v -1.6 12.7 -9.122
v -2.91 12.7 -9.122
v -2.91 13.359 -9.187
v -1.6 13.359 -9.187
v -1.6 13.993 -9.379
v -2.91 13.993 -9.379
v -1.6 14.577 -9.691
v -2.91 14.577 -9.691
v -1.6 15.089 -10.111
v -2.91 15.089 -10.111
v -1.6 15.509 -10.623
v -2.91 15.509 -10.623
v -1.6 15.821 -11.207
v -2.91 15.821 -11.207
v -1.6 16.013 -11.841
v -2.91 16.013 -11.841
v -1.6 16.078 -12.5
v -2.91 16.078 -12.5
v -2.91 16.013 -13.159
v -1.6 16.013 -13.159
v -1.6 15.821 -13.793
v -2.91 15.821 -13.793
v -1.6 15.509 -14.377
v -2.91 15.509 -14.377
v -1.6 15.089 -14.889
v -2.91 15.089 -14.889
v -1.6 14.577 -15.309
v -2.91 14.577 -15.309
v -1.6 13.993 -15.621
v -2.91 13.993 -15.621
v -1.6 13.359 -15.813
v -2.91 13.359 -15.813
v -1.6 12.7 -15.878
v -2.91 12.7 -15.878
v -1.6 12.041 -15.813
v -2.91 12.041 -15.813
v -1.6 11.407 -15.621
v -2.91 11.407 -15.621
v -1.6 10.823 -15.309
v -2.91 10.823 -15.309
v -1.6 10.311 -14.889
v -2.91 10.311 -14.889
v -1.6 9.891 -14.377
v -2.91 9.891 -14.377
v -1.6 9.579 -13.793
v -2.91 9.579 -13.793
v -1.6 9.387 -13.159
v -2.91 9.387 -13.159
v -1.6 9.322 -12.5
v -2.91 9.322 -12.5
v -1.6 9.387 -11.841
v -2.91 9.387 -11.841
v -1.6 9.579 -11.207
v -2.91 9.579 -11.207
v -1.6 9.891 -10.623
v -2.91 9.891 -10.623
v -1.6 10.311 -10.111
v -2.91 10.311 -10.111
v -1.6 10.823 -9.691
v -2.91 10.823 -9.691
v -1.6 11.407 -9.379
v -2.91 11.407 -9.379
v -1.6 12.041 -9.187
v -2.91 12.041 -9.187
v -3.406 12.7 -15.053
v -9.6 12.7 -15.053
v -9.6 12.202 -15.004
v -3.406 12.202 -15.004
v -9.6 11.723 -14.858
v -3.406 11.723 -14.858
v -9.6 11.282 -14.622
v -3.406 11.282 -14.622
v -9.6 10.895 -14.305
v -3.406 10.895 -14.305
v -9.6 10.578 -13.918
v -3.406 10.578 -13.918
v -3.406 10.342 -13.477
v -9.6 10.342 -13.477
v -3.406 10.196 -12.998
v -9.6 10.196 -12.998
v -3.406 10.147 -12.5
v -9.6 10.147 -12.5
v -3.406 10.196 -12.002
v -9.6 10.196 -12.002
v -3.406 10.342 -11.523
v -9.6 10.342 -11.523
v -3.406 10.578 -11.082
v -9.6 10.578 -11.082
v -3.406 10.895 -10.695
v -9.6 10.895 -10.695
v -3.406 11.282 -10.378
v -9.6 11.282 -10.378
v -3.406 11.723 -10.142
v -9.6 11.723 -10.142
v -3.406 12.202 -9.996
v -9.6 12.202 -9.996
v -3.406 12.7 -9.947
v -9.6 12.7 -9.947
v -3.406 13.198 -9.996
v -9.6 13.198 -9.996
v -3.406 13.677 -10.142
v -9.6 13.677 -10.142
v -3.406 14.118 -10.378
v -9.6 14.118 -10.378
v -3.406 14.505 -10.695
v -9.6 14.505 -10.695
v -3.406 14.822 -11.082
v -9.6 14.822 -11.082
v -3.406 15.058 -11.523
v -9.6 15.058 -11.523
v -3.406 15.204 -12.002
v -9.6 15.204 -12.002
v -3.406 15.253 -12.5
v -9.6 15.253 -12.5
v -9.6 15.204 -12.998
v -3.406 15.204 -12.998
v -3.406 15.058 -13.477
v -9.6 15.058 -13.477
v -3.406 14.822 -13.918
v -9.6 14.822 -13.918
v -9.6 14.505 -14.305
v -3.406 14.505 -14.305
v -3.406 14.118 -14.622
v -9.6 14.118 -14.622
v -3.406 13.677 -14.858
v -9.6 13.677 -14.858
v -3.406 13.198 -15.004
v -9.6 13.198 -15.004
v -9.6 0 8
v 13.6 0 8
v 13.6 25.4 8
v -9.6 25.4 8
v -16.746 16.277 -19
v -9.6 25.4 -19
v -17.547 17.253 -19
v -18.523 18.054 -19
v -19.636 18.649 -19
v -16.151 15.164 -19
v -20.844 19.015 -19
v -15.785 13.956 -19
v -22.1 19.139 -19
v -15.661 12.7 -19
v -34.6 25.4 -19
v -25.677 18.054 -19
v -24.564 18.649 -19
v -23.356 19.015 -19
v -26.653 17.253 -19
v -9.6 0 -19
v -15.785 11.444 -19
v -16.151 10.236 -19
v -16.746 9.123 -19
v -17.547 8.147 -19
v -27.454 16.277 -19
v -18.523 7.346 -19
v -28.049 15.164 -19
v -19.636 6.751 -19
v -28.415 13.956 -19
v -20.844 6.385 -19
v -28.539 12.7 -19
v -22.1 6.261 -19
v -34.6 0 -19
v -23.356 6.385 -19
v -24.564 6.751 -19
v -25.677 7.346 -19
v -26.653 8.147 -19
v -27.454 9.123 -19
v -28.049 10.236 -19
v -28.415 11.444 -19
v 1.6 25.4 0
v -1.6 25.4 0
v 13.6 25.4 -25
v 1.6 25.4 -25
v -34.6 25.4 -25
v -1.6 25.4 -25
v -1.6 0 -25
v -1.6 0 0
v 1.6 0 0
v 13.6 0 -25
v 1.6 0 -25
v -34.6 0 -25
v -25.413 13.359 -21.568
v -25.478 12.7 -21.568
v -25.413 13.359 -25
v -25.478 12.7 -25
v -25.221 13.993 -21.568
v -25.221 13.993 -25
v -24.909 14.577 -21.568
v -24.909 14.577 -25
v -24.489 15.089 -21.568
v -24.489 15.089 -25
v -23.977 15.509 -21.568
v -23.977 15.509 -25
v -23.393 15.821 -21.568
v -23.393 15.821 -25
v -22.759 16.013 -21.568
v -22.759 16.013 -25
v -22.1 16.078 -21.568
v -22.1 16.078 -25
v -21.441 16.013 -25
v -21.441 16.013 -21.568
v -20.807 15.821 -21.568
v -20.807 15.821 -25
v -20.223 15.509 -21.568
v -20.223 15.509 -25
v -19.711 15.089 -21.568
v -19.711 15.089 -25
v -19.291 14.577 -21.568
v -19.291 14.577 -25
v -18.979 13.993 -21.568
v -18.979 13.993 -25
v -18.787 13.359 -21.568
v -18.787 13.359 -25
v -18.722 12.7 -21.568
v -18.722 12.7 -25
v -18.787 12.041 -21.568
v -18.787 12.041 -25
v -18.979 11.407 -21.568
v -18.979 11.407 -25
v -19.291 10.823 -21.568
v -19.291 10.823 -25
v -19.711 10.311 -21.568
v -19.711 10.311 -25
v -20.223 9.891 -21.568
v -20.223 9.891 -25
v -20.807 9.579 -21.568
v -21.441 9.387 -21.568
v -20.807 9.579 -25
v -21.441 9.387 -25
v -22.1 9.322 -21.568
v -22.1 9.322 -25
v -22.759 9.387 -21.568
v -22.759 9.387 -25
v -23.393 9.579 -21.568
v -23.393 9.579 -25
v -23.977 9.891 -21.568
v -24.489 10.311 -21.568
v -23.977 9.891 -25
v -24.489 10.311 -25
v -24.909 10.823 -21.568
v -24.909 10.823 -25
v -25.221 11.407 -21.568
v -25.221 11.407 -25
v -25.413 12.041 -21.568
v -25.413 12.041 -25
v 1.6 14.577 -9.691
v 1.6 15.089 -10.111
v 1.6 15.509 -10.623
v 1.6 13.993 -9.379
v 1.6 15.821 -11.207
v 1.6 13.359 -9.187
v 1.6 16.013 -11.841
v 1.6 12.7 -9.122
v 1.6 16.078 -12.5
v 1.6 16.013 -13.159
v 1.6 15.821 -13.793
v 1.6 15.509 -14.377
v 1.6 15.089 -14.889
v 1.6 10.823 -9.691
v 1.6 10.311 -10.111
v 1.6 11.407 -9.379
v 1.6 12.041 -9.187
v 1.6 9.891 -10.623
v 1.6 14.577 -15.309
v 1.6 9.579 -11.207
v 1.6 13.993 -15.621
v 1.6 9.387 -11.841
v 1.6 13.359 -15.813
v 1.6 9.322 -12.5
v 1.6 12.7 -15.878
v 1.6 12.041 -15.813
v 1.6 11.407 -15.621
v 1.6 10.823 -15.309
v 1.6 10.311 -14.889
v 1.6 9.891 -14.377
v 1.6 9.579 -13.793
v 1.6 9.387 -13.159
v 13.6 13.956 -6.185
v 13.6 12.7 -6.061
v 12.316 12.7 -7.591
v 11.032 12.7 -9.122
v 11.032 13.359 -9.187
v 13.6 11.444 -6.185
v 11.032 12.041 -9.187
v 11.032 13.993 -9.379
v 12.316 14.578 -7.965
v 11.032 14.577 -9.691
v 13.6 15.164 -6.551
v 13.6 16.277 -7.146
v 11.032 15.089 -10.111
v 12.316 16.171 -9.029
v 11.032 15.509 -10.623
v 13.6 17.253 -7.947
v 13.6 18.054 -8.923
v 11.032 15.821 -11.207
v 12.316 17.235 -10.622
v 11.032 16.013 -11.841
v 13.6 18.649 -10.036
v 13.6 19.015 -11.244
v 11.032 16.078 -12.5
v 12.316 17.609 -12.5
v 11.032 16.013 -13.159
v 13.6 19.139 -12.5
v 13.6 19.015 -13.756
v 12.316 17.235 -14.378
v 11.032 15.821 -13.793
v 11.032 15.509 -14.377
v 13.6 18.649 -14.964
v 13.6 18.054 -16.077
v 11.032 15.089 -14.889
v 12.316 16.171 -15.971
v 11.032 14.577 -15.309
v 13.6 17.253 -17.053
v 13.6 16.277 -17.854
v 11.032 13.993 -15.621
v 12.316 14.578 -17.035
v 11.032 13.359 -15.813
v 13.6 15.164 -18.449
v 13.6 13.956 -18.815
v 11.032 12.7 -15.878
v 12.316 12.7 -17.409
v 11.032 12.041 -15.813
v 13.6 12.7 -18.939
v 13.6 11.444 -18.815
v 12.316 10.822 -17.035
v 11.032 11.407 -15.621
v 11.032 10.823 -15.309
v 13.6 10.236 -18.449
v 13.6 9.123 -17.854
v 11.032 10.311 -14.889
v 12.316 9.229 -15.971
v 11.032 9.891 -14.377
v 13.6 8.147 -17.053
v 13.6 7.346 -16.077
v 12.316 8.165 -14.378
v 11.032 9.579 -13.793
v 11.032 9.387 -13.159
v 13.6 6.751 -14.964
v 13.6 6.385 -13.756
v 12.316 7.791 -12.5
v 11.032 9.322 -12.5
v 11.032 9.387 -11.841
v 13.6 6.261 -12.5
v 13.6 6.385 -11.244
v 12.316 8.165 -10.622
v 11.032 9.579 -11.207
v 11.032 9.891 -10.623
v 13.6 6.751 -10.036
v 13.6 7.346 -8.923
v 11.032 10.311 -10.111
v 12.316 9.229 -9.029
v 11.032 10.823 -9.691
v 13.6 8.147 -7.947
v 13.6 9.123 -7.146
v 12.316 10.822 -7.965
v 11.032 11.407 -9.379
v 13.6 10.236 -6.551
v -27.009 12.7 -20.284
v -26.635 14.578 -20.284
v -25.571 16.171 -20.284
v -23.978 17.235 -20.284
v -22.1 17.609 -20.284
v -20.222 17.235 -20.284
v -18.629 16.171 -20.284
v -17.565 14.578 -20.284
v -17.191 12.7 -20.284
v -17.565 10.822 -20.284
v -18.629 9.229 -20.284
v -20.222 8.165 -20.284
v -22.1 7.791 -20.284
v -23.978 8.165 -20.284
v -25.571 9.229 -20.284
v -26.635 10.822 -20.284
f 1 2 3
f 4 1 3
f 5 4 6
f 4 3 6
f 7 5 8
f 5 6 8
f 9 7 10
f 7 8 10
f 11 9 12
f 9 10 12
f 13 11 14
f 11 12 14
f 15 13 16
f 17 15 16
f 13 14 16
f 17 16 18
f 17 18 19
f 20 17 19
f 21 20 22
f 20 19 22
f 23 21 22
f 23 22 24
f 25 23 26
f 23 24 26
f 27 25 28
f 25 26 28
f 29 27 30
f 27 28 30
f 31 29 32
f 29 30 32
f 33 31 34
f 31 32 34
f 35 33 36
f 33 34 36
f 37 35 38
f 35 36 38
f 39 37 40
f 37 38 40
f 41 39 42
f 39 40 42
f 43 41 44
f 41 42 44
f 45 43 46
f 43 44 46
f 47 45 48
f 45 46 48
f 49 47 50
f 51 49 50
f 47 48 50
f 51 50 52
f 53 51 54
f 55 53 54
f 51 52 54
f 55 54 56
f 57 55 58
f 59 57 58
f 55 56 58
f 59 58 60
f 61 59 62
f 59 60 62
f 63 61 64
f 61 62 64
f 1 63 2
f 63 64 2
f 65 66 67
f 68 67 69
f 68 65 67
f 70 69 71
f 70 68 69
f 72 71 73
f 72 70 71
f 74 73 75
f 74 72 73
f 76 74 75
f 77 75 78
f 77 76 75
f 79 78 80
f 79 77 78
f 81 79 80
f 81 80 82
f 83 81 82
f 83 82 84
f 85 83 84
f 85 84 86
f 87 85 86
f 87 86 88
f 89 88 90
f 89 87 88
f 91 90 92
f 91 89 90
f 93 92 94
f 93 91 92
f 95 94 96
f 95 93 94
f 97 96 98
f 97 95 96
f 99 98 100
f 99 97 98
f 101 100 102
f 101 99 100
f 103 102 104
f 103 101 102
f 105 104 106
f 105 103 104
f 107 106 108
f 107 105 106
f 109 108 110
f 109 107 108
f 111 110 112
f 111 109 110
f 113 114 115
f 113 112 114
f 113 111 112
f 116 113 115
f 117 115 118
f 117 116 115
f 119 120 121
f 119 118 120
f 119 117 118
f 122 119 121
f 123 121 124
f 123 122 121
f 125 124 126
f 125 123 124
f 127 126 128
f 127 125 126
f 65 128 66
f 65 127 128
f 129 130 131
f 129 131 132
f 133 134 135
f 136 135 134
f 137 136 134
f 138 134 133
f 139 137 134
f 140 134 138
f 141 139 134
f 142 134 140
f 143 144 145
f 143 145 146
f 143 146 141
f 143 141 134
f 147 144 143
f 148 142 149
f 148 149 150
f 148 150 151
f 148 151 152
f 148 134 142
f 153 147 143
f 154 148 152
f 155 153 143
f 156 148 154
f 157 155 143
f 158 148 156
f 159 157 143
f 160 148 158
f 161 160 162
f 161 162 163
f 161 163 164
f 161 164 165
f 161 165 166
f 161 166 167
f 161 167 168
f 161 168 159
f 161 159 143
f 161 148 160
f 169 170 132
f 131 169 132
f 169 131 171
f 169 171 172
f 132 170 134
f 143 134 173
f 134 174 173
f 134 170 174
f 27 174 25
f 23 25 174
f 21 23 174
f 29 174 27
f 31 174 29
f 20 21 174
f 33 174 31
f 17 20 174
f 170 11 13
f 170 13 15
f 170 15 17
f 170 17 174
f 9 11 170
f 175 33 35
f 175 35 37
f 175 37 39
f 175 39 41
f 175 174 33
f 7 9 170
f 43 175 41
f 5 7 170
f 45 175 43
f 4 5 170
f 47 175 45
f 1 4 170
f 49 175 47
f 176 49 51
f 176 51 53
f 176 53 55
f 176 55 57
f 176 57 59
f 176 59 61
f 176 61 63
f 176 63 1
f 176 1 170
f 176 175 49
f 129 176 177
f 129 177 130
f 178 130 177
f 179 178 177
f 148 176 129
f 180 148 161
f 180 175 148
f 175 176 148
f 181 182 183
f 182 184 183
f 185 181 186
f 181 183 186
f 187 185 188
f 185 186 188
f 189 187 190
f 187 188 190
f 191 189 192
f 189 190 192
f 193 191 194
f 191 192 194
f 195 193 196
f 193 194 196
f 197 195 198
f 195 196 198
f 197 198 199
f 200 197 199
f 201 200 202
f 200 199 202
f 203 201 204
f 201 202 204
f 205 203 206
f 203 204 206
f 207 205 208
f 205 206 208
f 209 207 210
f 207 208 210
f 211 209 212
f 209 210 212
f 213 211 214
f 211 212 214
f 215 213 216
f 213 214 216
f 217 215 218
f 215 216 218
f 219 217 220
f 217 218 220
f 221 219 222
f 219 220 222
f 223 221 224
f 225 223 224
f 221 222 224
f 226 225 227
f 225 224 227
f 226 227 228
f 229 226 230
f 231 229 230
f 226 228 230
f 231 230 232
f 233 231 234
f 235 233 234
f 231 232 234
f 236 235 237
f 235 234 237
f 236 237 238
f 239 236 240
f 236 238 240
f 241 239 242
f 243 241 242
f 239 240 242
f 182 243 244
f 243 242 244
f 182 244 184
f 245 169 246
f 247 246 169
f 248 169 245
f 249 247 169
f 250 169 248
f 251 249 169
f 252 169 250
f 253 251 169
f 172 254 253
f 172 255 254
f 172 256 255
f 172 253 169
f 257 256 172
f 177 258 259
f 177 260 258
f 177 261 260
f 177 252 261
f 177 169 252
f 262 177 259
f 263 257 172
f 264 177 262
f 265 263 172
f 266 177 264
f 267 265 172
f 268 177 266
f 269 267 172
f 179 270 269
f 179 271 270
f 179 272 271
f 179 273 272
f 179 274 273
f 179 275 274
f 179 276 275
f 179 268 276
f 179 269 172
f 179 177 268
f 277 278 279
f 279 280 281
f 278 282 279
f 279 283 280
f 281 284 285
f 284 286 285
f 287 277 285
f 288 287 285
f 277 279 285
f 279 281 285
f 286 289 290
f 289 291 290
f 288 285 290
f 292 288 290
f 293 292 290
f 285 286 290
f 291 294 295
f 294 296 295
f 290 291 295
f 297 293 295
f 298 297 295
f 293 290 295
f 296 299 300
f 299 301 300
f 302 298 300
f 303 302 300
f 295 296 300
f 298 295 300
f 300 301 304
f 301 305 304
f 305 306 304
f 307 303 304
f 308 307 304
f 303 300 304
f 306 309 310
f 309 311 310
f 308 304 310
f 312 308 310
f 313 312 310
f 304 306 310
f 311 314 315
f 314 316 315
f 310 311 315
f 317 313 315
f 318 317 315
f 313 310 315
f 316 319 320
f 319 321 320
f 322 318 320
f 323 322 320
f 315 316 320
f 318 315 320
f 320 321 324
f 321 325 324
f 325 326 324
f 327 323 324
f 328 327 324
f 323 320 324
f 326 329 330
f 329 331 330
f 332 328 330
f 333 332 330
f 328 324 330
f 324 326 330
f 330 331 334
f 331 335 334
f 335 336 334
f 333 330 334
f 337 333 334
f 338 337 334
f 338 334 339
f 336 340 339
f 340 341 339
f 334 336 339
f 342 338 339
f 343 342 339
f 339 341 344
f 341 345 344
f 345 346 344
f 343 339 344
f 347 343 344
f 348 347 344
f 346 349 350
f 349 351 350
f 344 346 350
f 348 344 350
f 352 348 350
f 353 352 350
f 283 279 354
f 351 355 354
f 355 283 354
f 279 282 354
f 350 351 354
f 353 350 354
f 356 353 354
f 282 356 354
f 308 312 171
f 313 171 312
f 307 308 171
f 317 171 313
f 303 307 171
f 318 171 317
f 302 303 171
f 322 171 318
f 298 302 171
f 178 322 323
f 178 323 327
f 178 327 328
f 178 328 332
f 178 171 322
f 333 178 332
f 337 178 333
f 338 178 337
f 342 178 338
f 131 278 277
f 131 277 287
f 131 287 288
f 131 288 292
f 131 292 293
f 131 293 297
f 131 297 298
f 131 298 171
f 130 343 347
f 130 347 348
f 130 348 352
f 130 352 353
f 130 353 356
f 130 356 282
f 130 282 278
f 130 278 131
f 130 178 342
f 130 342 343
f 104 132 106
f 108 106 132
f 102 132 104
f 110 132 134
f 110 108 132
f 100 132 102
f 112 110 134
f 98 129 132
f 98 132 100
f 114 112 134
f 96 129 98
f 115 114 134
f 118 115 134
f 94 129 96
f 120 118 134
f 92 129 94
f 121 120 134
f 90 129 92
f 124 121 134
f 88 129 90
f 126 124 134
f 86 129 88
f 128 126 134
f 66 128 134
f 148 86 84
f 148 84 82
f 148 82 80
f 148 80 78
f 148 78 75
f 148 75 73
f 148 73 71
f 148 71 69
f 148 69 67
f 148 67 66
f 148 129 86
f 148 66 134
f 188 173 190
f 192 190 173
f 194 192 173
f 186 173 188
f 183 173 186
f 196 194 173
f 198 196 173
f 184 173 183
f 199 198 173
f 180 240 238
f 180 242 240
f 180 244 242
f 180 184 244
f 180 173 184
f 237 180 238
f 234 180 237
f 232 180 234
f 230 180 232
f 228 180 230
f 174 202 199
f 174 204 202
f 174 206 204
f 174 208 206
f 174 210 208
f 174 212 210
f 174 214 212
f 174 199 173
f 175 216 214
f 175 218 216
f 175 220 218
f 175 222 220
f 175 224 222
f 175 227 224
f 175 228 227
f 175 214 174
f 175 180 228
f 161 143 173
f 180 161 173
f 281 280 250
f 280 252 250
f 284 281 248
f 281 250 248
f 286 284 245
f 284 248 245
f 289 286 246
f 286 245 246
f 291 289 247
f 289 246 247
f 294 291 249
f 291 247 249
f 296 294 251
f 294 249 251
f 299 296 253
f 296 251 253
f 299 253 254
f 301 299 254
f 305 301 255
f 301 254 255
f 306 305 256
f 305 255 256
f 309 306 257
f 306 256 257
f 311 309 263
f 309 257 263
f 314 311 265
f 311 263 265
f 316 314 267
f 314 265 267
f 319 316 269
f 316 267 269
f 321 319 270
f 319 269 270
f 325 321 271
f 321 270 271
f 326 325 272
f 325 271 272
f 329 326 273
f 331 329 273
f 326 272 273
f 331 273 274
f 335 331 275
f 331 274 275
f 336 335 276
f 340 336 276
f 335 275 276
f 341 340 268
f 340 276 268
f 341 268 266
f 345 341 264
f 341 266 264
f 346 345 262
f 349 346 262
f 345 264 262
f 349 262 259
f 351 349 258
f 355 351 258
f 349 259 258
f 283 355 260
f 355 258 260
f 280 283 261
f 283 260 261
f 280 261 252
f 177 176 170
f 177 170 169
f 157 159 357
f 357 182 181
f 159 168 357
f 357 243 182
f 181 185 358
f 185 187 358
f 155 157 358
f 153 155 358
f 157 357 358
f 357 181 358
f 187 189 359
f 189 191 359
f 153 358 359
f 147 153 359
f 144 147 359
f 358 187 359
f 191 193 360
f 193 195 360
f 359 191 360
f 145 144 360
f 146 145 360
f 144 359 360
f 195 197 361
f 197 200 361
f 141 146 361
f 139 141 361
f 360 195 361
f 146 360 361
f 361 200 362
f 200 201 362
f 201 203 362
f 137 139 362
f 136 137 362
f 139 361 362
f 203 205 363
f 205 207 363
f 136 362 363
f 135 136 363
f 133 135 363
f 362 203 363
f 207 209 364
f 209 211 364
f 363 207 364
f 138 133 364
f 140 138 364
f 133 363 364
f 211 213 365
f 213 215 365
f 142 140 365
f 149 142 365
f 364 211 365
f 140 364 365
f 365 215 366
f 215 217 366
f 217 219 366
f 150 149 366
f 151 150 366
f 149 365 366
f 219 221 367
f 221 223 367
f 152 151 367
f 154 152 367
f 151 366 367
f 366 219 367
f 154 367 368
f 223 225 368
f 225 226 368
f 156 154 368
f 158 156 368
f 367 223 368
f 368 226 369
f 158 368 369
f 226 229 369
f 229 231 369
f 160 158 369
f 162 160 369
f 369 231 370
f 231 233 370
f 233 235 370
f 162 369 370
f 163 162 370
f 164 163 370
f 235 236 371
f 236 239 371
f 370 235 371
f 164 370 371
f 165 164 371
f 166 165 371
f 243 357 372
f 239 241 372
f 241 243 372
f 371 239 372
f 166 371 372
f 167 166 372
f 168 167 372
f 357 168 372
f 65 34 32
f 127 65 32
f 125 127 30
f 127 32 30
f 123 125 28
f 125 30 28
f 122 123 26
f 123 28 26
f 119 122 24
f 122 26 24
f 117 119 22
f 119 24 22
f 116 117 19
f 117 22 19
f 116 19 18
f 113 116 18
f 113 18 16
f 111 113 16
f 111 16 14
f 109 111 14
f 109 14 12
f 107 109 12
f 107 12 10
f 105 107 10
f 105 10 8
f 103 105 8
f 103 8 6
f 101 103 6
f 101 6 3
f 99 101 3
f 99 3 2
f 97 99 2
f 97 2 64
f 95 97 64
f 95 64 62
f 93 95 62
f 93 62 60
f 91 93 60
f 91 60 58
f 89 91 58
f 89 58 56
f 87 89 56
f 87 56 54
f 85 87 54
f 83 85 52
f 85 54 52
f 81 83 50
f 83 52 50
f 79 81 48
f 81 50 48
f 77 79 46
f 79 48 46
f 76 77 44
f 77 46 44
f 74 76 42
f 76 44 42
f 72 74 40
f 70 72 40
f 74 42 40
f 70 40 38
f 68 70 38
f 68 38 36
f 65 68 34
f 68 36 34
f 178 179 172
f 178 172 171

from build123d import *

# Parameters (mm, degrees)
BOSS_EXTRUDE1_DEPTH                                 = 25.4
CSK_FOR_1_4_FLAT_HEAD_MACHINE_SCREW_100_D           = 6.7564
CSK_FOR_1_4_FLAT_HEAD_MACHINE_SCREW_100_DEPTH       = 16.51
CSK_FOR_1_4_FLAT_HEAD_MACHINE_SCREW_100_CSINK_D     = 12.8778
CSK_FOR_1_4_FLAT_HEAD_MACHINE_SCREW_100_CSINK_ANGLE = 100
CSK_FOR_1_4_FLAT_HEAD_MACHINE_SCREW_100_TIP         = 2.029827343
CSK_FOR_1_4_FLAT_HEAD_MACHINE_SCREW_2_D             = 6.7564
CSK_FOR_1_4_FLAT_HEAD_MACHINE_SCREW_2_DEPTH         = 16.51
CSK_FOR_1_4_FLAT_HEAD_MACHINE_SCREW_2_CSINK_D       = 12.8778
CSK_FOR_1_4_FLAT_HEAD_MACHINE_SCREW_2_CSINK_ANGLE   = 100
CSK_FOR_1_4_FLAT_HEAD_MACHINE_SCREW_2_TIP           = 2.029827343


with BuildPart() as part:
    # Sketch1 → Boss-Extrude1 (new body)
    with BuildSketch(Plane(origin=(0, 0, 0), x_dir=(1, 0, 0), z_dir=(0, 1, 0))):
        Polygon((-1.6, 0), (1.6, 0), (1.6, 25), (13.6, 25), (13.6, -8), (-9.6, -8), (-9.6, 19), (-34.6, 19), (-34.6, 25), (-1.6, 25), align=None)
    extrude(amount=BOSS_EXTRUDE1_DEPTH)

    # Sketch3 → 1/4-20 Tapped Hole1 (revolve, cut)
    with BuildSketch(Plane(origin=(-1.6, 12.7, -12.5), x_dir=(0, 0, -1), z_dir=(0, 1, 0))):
        Polygon((0, 0), (0, 18.043816902), (2.5527, 16.51), (2.5527, 0), align=None)
    revolve(axis=Axis((4.75, 12.7, -12.5), (-1, 0, 0)), mode=Mode.SUBTRACT)

    # CSK for 1_4 Flat Head Machine Screw _100
    with Locations(Plane(origin=(13.6, 0, 0), x_dir=(0, 0, -1), z_dir=(1, 0, 0))):
        with Locations((12.5, 12.7)):
            CounterSinkHole(CSK_FOR_1_4_FLAT_HEAD_MACHINE_SCREW_100_D / 2, CSK_FOR_1_4_FLAT_HEAD_MACHINE_SCREW_100_CSINK_D / 2, depth=CSK_FOR_1_4_FLAT_HEAD_MACHINE_SCREW_100_DEPTH, counter_sink_angle=CSK_FOR_1_4_FLAT_HEAD_MACHINE_SCREW_100_CSINK_ANGLE)
            with Locations((0, 0, -(CSK_FOR_1_4_FLAT_HEAD_MACHINE_SCREW_100_DEPTH + CSK_FOR_1_4_FLAT_HEAD_MACHINE_SCREW_100_TIP / 2))):  # 118° drill point
                Cone(0, CSK_FOR_1_4_FLAT_HEAD_MACHINE_SCREW_100_D / 2, CSK_FOR_1_4_FLAT_HEAD_MACHINE_SCREW_100_TIP, mode=Mode.SUBTRACT)

    # CSK for 1_4 Flat Head Machine Screw  2
    with Locations(Plane.XY.offset(-19)):
        with Locations((-22.1, 12.7)):
            CounterSinkHole(CSK_FOR_1_4_FLAT_HEAD_MACHINE_SCREW_2_D / 2, CSK_FOR_1_4_FLAT_HEAD_MACHINE_SCREW_2_CSINK_D / 2, depth=CSK_FOR_1_4_FLAT_HEAD_MACHINE_SCREW_2_DEPTH, counter_sink_angle=CSK_FOR_1_4_FLAT_HEAD_MACHINE_SCREW_2_CSINK_ANGLE)
            with Locations((0, 0, -(CSK_FOR_1_4_FLAT_HEAD_MACHINE_SCREW_2_DEPTH + CSK_FOR_1_4_FLAT_HEAD_MACHINE_SCREW_2_TIP / 2))):  # 118° drill point
                Cone(0, CSK_FOR_1_4_FLAT_HEAD_MACHINE_SCREW_2_D / 2, CSK_FOR_1_4_FLAT_HEAD_MACHINE_SCREW_2_TIP, mode=Mode.SUBTRACT)


solid = part.part
